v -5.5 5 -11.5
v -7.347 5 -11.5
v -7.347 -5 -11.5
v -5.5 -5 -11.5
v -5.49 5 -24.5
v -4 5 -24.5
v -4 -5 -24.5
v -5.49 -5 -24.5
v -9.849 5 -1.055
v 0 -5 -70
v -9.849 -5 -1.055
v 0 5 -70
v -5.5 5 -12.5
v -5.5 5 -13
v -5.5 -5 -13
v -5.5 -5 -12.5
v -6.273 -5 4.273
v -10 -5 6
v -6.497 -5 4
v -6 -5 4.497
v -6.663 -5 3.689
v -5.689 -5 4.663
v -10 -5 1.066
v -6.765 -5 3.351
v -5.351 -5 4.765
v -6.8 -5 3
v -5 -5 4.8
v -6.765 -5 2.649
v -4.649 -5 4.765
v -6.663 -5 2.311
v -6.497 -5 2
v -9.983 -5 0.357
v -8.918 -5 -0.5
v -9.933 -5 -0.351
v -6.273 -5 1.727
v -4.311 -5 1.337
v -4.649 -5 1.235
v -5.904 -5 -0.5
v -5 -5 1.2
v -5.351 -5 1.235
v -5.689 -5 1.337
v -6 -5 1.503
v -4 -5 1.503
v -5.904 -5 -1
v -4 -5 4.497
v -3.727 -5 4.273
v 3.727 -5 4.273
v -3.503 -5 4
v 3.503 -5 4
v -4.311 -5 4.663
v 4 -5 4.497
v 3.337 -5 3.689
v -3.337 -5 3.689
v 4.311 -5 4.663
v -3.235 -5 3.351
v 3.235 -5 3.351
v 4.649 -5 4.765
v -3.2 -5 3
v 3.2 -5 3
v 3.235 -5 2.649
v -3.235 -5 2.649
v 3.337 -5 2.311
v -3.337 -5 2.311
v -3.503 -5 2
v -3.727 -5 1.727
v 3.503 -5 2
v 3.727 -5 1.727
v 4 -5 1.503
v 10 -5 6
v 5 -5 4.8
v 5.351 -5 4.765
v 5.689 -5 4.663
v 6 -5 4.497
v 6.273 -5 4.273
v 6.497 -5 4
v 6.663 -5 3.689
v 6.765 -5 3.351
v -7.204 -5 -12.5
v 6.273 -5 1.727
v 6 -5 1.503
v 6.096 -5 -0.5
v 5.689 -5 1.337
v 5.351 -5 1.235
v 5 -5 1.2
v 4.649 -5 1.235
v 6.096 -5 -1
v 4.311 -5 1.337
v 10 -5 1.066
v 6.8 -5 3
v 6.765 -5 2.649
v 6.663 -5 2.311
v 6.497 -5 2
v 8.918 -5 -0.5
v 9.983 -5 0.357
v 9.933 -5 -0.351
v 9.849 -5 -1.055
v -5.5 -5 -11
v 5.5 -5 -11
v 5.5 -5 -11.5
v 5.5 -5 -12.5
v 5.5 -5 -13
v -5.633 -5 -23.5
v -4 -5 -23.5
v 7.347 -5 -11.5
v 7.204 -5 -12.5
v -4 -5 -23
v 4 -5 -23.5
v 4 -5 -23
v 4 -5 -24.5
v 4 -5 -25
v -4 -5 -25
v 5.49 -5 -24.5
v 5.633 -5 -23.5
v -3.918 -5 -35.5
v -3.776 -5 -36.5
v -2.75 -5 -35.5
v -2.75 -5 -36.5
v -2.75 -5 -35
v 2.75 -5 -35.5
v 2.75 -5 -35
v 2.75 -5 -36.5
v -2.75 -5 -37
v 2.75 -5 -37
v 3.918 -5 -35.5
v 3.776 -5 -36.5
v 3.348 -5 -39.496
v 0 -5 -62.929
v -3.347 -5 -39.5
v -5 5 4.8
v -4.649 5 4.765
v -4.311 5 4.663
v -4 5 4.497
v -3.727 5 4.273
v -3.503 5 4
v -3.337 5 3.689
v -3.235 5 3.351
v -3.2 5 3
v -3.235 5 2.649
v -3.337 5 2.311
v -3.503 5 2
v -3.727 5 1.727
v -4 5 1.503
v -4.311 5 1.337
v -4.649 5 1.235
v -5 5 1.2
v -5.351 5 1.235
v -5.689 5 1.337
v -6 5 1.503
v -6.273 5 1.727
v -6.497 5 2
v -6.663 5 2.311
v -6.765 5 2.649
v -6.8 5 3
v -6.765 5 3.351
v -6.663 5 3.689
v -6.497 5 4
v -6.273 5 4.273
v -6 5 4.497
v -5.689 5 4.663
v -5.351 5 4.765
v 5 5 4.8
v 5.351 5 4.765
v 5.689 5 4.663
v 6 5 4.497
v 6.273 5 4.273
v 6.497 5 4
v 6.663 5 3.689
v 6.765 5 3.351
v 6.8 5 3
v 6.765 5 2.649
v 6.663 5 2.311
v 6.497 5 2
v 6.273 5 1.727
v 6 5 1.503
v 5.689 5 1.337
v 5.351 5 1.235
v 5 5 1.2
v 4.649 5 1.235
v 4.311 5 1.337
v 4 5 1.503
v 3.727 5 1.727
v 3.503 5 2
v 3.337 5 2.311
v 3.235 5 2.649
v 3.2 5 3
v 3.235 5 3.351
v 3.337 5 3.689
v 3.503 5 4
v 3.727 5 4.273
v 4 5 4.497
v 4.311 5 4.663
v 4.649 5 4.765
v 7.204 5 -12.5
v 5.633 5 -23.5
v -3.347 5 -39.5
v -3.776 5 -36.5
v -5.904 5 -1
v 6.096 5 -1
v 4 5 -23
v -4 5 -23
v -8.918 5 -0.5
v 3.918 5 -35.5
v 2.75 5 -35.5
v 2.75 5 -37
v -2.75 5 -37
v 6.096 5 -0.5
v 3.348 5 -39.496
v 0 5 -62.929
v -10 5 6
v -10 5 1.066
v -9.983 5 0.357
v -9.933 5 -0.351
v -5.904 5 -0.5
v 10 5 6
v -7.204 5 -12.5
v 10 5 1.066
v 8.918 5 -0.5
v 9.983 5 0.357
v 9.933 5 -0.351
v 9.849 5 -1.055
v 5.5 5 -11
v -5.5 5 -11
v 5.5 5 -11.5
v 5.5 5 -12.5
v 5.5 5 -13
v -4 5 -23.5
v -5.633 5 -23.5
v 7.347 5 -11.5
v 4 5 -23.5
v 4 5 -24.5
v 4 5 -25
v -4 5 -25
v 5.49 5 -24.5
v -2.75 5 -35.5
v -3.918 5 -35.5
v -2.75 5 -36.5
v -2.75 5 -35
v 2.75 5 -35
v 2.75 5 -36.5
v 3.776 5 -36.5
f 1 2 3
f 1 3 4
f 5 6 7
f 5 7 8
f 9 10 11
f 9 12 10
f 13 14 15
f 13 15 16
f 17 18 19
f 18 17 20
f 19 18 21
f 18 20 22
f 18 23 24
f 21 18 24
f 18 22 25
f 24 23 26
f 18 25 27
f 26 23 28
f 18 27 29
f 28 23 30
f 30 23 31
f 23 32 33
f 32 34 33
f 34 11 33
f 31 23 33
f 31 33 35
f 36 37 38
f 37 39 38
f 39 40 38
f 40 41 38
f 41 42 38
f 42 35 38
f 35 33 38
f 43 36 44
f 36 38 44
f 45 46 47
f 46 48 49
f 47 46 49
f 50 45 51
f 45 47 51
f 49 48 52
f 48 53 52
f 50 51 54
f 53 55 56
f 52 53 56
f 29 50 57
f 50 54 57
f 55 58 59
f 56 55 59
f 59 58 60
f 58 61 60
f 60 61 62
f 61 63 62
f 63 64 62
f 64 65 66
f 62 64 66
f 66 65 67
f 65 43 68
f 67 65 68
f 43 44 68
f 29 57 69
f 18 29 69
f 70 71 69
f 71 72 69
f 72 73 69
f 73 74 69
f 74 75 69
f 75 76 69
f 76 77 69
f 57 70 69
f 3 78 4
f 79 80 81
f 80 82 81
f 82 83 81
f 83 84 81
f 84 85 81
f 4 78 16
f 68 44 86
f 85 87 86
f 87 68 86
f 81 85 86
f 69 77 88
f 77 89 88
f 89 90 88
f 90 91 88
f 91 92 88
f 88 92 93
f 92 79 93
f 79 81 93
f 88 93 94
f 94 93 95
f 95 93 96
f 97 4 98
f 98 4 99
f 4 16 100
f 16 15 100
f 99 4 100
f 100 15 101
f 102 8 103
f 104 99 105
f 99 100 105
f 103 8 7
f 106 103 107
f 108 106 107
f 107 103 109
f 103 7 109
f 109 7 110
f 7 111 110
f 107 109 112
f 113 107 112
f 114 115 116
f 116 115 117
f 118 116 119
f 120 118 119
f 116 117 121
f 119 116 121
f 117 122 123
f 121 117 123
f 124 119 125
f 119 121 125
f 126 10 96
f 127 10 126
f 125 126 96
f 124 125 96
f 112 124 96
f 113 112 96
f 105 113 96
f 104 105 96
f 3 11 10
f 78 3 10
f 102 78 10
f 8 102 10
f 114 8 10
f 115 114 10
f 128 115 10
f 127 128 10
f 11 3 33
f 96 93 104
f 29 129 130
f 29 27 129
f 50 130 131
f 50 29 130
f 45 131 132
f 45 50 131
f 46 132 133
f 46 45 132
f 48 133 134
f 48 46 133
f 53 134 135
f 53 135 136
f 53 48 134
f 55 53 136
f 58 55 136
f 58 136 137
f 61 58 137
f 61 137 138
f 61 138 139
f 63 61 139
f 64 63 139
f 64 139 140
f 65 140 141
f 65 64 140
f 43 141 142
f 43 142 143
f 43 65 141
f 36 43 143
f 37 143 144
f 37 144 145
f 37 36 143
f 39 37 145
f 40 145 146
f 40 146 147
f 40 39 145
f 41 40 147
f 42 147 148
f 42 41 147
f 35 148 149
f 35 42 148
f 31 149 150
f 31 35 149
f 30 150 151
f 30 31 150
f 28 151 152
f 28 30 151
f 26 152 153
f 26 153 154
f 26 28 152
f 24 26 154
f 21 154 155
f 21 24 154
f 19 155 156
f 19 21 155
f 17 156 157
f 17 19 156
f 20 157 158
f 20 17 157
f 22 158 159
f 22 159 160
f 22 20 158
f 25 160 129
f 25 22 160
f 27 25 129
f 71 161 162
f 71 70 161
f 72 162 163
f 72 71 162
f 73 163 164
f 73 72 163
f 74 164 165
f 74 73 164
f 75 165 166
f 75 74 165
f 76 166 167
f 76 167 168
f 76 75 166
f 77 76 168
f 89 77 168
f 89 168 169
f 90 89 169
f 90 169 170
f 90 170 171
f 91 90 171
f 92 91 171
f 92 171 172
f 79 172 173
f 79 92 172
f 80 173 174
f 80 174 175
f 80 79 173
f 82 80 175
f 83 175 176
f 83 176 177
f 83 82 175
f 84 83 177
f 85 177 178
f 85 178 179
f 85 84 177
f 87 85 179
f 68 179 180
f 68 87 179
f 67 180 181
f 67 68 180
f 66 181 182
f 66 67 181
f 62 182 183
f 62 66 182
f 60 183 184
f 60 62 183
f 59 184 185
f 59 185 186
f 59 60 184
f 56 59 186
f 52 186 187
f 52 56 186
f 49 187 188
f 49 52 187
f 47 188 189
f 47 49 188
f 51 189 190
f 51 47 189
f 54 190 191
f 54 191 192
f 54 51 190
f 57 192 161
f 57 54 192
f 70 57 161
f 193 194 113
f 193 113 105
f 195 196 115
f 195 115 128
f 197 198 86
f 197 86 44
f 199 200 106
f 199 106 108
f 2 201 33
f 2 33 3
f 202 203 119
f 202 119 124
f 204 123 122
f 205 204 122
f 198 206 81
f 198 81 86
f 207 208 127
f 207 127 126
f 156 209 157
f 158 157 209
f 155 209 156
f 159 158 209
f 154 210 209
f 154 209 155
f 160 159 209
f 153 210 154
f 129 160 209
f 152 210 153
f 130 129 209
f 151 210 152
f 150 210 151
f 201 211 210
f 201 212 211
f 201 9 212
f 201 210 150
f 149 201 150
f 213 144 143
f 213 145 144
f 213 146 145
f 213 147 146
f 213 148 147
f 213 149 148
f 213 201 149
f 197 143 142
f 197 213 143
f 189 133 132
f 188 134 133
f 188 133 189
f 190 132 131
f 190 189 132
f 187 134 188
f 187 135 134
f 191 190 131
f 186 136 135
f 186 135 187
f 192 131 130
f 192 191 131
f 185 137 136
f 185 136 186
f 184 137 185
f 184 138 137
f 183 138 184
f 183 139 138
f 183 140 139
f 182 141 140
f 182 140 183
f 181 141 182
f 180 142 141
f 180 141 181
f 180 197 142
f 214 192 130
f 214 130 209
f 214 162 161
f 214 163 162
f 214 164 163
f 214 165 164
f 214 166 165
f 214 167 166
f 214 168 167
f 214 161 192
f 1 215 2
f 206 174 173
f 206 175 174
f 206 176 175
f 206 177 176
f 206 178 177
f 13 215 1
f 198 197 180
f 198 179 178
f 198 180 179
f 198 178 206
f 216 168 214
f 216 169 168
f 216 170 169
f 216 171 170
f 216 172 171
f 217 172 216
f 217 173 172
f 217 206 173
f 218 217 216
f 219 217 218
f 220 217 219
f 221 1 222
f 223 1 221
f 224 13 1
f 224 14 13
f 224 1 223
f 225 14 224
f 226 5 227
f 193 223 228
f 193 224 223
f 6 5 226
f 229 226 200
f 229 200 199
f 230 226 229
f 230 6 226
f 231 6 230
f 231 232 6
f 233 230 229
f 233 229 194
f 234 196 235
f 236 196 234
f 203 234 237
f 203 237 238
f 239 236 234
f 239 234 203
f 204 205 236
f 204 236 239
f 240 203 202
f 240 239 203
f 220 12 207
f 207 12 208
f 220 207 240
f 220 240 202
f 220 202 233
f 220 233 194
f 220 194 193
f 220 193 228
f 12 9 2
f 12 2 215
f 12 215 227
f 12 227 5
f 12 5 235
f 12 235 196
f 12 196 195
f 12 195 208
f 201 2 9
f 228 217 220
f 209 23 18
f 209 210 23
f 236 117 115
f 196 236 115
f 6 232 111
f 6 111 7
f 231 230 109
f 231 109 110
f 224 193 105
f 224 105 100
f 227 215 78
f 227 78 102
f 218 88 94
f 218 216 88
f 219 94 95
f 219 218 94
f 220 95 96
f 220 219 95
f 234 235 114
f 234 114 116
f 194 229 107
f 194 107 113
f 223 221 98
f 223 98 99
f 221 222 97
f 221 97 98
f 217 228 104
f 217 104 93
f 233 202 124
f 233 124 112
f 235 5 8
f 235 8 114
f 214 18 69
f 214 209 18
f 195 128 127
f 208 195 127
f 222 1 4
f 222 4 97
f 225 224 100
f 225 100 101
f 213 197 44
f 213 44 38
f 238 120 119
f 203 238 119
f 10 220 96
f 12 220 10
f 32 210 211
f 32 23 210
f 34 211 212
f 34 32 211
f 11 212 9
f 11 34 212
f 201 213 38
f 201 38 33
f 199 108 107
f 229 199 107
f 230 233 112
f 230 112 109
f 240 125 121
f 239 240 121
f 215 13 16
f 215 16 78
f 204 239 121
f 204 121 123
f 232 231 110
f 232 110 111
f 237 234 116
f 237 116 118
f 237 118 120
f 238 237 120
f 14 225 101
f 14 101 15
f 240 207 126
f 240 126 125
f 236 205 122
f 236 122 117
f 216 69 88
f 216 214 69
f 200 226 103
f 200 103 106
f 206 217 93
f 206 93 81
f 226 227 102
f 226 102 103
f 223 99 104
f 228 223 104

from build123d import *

# Parameters (mm, degrees)
SKETCH1_R           = 1.8
BOSS_EXTRUDE1_DEPTH = 5
FILLET1_R           = 15


with BuildPart() as part:
    # Sketch1 → Boss-Extrude1 (new, symmetric)
    with BuildSketch(Plane(origin=(0, 0, 0), x_dir=(1, 0, 0), z_dir=(0, 1, 0))):
        Polygon((10, -6), (10, 0), (0, 70), (-10, 0), (-10, -6), align=None)
        with Locations(Location((-5, -3, 0), (0, 0, 270))):
            Circle(SKETCH1_R, mode=Mode.SUBTRACT)
        with Locations(Location((5, -3, 0), (0, 0, 270))):
            Circle(SKETCH1_R, mode=Mode.SUBTRACT)
        Polygon((-8.918418884, 0.5), (-7.346990313, 11.5), (-5.5, 11.5), (-5.5, 11), (5.5, 11), (5.5, 11.5), (7.346990313, 11.5), (8.918418884, 0.5), (6.096000551, 0.5), (6.096000551, 1), (-5.903999449, 1), (-5.903999449, 0.5), align=None, mode=Mode.SUBTRACT)
        Polygon((-5.5, 12.5), (-7.20413317, 12.5), (-5.632704598, 23.5), (-4, 23.5), (-4, 23), (4, 23), (4, 23.5), (5.632704598, 23.5), (7.20413317, 12.5), (5.5, 12.5), (5.5, 13), (-5.5, 13), align=None, mode=Mode.SUBTRACT)
        Polygon((-4, 24.5), (-5.489847455, 24.5), (-3.918418884, 35.5), (-2.75, 35.5), (-2.75, 35), (2.75, 35), (2.75, 35.5), (3.918418884, 35.5), (5.489847455, 24.5), (4, 24.5), (4, 25), (-4, 25), align=None, mode=Mode.SUBTRACT)
        Polygon((-3.346933757, 39.500395887), (0, 62.928932188), (3.347561625, 39.496000816), (3.775561741, 36.5), (2.75, 36.5), (2.75, 37), (-2.75, 37), (-2.75, 36.5), (-3.775561741, 36.5), align=None, mode=Mode.SUBTRACT)
    extrude(amount=BOSS_EXTRUDE1_DEPTH, both=True)

    # Fillet1
    fillet1_edges = [part.edges().sort_by_distance(p)[0] for p in [
        (-10, 0, 0),
        (10, 0, 0),
    ]]
    fillet(fillet1_edges, radius=FILLET1_R)


solid = part.part
